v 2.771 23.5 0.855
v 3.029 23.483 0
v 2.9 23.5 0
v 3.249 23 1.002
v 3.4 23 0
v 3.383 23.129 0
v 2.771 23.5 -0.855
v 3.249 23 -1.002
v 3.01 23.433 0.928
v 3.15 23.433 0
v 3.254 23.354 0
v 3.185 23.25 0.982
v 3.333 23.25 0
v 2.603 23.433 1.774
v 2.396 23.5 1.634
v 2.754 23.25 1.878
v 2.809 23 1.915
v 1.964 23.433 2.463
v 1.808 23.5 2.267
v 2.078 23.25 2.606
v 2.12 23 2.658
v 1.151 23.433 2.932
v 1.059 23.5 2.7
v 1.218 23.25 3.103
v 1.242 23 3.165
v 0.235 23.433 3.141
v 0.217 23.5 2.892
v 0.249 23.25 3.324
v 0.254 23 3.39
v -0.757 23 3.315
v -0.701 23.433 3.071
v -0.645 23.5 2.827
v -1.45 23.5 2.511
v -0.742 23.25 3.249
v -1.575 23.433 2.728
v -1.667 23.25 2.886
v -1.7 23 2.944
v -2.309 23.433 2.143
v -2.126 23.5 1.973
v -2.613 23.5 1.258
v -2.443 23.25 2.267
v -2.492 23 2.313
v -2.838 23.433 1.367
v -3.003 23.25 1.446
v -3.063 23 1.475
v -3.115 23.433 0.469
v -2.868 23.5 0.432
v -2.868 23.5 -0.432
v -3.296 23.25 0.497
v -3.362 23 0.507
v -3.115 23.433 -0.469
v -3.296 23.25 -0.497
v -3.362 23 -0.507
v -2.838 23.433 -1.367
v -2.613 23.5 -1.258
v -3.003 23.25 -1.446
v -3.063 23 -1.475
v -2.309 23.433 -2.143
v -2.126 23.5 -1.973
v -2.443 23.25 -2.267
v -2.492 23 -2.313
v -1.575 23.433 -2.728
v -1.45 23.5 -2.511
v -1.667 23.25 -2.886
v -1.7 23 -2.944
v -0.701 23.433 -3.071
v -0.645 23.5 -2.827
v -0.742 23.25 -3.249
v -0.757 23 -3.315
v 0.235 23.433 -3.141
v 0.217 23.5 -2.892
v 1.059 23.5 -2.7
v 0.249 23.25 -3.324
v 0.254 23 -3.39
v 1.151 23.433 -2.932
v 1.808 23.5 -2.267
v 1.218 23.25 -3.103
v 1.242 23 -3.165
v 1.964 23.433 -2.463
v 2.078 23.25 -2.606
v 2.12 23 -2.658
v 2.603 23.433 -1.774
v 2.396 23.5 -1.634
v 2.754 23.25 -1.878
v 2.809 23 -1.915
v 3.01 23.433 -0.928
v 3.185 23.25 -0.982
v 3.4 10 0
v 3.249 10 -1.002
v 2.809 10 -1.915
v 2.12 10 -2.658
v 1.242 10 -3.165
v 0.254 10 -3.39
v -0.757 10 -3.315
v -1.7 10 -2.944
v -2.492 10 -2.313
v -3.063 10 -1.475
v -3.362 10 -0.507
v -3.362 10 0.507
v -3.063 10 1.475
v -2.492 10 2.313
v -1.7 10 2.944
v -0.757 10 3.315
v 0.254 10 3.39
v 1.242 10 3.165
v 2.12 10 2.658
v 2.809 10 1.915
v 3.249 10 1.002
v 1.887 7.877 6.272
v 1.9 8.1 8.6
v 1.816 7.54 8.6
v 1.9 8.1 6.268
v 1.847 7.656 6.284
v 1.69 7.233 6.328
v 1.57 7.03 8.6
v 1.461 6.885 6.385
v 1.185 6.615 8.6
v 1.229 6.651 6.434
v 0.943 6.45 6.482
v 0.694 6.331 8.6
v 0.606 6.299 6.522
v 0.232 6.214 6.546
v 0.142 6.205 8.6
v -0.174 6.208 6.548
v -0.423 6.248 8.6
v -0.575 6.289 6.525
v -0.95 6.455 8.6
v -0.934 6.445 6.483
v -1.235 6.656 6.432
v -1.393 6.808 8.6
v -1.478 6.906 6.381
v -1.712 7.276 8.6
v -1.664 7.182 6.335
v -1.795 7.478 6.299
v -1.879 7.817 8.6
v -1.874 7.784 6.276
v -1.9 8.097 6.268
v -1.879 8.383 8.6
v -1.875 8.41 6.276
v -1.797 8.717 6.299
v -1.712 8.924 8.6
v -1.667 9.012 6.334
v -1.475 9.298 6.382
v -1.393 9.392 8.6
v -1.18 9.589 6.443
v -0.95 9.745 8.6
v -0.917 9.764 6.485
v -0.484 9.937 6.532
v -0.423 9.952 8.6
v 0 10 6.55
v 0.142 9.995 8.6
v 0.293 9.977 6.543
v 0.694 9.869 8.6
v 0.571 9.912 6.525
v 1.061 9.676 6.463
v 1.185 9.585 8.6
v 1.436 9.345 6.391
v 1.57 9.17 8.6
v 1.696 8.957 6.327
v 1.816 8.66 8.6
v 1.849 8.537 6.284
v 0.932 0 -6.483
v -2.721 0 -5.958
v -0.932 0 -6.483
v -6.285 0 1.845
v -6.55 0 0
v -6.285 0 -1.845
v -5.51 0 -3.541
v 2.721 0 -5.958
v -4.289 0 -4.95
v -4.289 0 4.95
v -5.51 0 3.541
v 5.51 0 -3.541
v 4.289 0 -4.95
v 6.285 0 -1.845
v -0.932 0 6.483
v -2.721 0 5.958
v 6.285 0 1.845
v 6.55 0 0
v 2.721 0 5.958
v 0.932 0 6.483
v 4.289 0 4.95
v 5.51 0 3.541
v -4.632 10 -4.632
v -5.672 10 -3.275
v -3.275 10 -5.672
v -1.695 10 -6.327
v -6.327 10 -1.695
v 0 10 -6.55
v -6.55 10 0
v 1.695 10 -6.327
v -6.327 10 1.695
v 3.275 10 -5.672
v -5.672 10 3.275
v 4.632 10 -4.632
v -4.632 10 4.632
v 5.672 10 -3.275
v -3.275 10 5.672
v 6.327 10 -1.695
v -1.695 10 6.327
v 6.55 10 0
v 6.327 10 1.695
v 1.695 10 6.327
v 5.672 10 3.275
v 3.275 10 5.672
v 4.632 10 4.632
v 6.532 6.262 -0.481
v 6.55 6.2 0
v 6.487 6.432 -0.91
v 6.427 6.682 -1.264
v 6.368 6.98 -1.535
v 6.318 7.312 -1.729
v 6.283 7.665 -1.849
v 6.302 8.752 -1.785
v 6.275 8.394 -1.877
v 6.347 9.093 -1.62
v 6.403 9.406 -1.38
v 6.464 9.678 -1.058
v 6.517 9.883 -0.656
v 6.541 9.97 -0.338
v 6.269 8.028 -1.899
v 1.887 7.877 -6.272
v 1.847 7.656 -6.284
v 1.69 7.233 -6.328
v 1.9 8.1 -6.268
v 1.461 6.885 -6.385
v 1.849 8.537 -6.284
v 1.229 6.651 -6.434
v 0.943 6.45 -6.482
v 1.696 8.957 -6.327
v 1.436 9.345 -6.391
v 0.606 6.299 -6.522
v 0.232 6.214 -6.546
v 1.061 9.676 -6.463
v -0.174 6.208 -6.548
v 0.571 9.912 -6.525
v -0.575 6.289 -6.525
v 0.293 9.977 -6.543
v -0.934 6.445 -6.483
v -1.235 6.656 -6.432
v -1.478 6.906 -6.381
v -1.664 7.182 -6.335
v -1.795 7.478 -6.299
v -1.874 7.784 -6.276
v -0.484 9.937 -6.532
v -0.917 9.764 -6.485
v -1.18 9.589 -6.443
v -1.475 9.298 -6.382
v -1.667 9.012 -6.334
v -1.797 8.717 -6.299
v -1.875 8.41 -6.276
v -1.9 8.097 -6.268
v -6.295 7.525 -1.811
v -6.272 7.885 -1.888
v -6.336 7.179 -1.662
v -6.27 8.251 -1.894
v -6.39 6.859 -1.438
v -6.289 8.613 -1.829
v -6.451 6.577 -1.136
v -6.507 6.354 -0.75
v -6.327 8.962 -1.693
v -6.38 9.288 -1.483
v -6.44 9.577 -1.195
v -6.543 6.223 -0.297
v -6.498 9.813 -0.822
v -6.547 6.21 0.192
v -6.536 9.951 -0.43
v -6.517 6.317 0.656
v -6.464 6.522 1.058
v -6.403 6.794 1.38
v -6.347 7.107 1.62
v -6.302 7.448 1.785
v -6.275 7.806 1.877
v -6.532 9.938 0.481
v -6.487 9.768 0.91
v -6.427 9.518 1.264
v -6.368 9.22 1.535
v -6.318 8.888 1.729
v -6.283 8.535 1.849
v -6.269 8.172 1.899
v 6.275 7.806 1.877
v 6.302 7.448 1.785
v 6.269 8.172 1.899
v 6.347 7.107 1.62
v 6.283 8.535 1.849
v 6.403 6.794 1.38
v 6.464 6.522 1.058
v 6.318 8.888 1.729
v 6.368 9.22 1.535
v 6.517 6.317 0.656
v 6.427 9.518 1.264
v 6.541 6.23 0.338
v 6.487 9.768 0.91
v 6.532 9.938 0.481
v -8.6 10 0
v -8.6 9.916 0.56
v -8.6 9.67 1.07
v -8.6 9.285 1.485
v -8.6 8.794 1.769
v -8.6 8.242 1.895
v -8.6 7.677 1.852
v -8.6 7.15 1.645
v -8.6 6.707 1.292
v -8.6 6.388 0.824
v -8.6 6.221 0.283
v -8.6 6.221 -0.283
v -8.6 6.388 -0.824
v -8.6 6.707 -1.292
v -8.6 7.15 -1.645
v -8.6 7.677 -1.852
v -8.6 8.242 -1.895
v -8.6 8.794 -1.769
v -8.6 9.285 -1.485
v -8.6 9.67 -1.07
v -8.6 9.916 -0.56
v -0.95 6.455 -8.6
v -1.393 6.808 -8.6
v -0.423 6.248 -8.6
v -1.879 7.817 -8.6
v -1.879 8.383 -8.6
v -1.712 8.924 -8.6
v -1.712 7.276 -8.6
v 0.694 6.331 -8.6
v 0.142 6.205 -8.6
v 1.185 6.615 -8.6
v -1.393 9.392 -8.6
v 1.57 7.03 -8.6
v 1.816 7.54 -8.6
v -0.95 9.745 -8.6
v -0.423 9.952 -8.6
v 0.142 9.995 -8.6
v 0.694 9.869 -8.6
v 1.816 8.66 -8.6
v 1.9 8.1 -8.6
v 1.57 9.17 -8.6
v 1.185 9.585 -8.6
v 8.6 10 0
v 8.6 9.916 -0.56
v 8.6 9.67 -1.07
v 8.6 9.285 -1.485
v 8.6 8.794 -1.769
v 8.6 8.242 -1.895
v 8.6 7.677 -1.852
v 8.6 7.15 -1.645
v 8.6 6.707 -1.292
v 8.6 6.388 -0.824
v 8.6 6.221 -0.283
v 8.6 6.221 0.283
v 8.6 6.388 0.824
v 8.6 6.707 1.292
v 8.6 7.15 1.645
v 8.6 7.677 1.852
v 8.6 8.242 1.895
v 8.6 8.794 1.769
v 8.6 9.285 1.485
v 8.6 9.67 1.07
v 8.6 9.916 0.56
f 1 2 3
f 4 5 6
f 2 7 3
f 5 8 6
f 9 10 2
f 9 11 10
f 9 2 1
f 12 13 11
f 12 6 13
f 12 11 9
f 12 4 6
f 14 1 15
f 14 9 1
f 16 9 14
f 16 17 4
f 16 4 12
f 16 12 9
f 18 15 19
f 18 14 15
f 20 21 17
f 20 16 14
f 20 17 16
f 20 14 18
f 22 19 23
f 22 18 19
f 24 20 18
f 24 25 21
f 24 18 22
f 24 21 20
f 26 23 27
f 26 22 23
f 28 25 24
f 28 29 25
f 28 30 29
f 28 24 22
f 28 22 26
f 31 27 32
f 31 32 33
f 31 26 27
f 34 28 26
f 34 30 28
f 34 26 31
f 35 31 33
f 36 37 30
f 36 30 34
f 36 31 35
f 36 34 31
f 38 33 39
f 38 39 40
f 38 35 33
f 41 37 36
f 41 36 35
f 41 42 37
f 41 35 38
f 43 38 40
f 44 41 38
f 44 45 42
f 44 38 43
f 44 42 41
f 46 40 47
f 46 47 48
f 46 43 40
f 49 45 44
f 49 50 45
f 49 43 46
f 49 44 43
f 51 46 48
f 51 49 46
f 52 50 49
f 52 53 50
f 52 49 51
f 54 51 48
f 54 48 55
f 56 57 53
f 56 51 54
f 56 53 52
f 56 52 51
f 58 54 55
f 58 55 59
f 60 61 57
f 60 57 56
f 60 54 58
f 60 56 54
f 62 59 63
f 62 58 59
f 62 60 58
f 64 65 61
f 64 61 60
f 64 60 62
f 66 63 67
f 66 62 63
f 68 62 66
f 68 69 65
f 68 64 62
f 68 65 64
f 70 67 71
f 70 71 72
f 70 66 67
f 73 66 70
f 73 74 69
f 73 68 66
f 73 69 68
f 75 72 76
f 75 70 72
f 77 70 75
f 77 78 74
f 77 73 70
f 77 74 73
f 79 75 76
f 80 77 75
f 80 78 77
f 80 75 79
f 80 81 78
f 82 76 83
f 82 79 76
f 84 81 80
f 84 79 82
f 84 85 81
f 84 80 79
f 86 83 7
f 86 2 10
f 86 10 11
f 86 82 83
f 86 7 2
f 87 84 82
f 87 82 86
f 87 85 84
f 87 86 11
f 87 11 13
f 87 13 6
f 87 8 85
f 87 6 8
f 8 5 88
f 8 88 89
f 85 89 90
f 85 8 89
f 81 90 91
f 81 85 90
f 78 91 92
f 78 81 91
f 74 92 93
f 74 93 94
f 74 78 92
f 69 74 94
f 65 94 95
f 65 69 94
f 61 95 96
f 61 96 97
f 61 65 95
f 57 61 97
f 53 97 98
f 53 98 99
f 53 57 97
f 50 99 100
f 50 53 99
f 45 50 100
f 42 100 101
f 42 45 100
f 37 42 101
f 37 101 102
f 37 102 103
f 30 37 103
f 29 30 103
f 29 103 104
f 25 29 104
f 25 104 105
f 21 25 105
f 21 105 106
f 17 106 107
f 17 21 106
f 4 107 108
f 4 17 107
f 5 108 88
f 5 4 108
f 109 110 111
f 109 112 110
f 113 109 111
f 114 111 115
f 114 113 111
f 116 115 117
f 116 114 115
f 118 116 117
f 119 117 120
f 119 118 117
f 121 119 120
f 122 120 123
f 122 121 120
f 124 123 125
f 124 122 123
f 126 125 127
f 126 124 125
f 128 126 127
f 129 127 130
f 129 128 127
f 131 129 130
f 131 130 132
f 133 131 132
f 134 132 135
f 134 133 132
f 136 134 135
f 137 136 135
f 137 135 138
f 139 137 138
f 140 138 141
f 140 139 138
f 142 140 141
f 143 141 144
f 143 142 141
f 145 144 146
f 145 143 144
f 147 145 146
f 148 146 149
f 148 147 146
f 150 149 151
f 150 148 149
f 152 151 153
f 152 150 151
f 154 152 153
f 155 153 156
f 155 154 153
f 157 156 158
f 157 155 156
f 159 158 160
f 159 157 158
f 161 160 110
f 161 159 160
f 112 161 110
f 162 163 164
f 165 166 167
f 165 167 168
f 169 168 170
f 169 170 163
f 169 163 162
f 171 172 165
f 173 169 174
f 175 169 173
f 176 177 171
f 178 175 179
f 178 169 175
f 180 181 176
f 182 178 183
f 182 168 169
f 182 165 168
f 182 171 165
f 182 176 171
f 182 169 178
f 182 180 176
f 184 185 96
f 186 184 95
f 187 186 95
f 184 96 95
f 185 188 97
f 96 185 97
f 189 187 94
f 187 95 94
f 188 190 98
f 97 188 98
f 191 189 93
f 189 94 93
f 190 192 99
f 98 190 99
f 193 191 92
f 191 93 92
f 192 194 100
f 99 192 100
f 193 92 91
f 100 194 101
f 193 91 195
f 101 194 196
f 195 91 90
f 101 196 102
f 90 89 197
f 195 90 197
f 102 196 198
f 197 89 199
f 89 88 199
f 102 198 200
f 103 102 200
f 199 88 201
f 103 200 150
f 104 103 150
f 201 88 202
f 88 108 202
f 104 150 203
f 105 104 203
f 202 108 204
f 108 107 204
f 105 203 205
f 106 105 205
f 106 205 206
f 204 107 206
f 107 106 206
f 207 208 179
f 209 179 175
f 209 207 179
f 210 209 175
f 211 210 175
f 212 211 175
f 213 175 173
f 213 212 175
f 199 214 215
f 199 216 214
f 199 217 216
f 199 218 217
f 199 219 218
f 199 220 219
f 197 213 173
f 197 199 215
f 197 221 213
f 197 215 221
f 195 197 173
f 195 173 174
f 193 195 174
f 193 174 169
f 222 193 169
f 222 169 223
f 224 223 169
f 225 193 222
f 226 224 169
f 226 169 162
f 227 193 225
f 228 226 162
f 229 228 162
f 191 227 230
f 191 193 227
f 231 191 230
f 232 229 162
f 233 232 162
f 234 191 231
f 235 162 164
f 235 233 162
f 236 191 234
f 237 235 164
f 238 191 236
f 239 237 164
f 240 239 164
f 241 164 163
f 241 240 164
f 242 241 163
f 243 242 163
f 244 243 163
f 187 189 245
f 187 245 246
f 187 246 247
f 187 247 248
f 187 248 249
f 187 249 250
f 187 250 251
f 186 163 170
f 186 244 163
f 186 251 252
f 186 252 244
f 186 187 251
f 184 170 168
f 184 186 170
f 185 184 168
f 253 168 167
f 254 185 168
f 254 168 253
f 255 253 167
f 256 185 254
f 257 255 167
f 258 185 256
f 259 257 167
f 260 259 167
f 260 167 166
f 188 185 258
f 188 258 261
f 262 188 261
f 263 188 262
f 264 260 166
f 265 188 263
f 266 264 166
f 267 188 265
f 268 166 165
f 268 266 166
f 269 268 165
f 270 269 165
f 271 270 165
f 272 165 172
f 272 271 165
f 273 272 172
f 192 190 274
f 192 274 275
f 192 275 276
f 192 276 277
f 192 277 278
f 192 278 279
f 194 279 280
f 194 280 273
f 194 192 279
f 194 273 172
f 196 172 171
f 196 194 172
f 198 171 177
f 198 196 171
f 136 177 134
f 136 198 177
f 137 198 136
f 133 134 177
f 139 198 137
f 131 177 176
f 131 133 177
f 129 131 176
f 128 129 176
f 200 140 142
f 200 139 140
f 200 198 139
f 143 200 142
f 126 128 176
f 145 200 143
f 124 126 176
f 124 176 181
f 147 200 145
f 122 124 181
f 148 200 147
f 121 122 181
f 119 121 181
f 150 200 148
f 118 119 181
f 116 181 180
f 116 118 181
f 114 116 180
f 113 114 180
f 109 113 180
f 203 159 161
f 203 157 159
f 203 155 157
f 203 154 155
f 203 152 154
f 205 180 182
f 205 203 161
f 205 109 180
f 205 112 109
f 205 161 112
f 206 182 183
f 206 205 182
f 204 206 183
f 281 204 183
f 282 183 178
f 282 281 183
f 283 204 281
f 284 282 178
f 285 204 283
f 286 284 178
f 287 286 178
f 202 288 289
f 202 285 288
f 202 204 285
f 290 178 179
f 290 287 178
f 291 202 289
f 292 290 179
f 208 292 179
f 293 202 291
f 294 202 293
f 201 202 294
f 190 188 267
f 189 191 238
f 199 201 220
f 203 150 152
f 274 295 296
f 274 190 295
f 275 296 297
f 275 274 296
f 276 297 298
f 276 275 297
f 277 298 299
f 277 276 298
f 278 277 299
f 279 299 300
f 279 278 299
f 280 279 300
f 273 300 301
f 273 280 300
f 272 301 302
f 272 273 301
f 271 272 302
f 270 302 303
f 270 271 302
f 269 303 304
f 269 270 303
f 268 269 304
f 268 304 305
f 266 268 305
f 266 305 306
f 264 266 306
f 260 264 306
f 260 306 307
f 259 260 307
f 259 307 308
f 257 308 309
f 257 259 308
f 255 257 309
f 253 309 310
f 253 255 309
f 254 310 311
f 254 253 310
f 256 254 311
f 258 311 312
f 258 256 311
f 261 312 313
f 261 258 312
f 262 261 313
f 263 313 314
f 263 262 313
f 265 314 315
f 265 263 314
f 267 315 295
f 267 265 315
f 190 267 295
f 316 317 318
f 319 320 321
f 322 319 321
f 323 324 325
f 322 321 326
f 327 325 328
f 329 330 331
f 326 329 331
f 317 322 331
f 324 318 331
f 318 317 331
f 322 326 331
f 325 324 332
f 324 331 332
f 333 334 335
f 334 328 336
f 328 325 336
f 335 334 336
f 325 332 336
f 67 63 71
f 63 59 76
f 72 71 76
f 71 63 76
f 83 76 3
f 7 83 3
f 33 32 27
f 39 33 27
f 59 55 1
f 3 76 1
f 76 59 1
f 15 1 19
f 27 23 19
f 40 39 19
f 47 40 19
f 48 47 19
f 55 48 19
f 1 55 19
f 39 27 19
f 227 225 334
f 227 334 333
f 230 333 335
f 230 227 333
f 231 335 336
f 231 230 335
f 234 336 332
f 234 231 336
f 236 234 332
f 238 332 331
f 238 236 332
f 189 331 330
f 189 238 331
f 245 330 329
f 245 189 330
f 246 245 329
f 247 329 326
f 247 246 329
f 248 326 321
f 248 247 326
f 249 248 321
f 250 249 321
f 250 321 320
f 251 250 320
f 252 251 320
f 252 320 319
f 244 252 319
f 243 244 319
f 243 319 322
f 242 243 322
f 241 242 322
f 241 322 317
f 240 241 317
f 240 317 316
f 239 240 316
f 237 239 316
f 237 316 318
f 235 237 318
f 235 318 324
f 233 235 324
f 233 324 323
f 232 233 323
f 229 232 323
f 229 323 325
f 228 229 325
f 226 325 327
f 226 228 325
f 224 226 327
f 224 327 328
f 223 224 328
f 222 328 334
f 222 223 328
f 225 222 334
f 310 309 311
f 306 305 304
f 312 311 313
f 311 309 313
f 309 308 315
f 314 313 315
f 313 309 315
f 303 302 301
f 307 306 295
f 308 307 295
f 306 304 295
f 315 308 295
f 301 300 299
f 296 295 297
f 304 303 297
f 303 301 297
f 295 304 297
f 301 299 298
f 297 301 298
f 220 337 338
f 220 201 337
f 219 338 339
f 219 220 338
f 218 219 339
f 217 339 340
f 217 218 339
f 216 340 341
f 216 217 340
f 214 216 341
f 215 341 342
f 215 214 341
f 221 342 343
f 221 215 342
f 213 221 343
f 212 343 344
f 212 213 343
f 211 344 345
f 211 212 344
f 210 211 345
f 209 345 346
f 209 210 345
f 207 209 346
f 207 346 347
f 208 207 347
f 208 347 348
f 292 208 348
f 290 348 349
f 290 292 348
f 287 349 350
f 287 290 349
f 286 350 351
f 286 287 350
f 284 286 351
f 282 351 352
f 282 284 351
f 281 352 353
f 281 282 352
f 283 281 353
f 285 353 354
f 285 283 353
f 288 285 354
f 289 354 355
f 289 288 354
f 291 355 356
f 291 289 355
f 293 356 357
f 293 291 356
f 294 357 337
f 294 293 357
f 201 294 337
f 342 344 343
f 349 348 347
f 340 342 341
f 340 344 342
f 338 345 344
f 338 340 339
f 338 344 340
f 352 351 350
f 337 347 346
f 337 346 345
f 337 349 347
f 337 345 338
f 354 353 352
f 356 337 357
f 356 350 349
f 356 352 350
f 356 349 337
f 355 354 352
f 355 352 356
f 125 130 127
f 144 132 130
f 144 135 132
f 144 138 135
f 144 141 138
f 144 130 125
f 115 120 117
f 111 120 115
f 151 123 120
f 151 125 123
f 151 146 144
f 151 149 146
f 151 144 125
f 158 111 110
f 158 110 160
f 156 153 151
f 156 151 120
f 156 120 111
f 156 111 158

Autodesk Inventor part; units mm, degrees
ref_plane "YZ Plane" through (0, 0, 0) normal (1, 0, 0) x (0, 1, 0)
ref_plane "XZ Plane" through (0, 0, 0) normal (0, 1, 0) x (-1, 0, 0)
ref_plane "XY Plane" through (0, 0, 0) normal (0, 0, 1) x (1, 0, 0)
sketch "Esboço1" plane through (0, 0, 0) normal (0, 0, 1) x (1, 0, 0)
  line L0 (0, 0) -> (6.55, 0)
  line L1 (6.55, 0) -> (6.55, 10)
  line L2 (6.55, 10) -> (3.4, 10)
  line L3 (3.4, 10) -> (3.4, 23.5)
  line L4 (3.4, 23.5) -> (0, 23.5)
  line L5 (0, 23.5) -> (0, 0)
  dimension "d0" = 6.55
  dimension "d1" = 10
  dimension "d3" = 13.5
  dimension "d14" = 3.4
revolve "Revolução1" add sketch "Esboço1" angle 360 about axis through (0, 23.5, 0) along (0, -1, 0)
sketch "Esboço2" plane through (0, 0, 0) normal (0, 0, 1) x (1, 0, 0)
  line L0 (-6.55, 10) -> (6.55, 10) projected
  line L1 (0, 10) -> (0, 8.1)
  circle A0 centre (0, 8.1) radius 1.9
  point P0 (0, 0)
  dimension "d11" = 3.8
  dimension "d5" = 1.9
extrude "Extrusão1" add sketch "Esboço2" along normal mid plane 17.2
sketch "Esboço3" plane through (0, 0, 0) normal (1, 0, 0) x (0, 1, 0)
  line L0 (10, 3.4) -> (10, -3.4) projected
  line L1 (10, 0) -> (8.1, 0)
  circle A0 centre (8.1, 0) radius 1.9
  point P0 (0, 0)
  dimension "d8" = 1.9
extrude "Extrusão2" add sketch "Esboço3" along normal mid plane 17.2
fillet "Arredondamento2" radius 0.5 1 edges at (-3.4, 23.5, 0)
properties part number "botao_3DPrint"
